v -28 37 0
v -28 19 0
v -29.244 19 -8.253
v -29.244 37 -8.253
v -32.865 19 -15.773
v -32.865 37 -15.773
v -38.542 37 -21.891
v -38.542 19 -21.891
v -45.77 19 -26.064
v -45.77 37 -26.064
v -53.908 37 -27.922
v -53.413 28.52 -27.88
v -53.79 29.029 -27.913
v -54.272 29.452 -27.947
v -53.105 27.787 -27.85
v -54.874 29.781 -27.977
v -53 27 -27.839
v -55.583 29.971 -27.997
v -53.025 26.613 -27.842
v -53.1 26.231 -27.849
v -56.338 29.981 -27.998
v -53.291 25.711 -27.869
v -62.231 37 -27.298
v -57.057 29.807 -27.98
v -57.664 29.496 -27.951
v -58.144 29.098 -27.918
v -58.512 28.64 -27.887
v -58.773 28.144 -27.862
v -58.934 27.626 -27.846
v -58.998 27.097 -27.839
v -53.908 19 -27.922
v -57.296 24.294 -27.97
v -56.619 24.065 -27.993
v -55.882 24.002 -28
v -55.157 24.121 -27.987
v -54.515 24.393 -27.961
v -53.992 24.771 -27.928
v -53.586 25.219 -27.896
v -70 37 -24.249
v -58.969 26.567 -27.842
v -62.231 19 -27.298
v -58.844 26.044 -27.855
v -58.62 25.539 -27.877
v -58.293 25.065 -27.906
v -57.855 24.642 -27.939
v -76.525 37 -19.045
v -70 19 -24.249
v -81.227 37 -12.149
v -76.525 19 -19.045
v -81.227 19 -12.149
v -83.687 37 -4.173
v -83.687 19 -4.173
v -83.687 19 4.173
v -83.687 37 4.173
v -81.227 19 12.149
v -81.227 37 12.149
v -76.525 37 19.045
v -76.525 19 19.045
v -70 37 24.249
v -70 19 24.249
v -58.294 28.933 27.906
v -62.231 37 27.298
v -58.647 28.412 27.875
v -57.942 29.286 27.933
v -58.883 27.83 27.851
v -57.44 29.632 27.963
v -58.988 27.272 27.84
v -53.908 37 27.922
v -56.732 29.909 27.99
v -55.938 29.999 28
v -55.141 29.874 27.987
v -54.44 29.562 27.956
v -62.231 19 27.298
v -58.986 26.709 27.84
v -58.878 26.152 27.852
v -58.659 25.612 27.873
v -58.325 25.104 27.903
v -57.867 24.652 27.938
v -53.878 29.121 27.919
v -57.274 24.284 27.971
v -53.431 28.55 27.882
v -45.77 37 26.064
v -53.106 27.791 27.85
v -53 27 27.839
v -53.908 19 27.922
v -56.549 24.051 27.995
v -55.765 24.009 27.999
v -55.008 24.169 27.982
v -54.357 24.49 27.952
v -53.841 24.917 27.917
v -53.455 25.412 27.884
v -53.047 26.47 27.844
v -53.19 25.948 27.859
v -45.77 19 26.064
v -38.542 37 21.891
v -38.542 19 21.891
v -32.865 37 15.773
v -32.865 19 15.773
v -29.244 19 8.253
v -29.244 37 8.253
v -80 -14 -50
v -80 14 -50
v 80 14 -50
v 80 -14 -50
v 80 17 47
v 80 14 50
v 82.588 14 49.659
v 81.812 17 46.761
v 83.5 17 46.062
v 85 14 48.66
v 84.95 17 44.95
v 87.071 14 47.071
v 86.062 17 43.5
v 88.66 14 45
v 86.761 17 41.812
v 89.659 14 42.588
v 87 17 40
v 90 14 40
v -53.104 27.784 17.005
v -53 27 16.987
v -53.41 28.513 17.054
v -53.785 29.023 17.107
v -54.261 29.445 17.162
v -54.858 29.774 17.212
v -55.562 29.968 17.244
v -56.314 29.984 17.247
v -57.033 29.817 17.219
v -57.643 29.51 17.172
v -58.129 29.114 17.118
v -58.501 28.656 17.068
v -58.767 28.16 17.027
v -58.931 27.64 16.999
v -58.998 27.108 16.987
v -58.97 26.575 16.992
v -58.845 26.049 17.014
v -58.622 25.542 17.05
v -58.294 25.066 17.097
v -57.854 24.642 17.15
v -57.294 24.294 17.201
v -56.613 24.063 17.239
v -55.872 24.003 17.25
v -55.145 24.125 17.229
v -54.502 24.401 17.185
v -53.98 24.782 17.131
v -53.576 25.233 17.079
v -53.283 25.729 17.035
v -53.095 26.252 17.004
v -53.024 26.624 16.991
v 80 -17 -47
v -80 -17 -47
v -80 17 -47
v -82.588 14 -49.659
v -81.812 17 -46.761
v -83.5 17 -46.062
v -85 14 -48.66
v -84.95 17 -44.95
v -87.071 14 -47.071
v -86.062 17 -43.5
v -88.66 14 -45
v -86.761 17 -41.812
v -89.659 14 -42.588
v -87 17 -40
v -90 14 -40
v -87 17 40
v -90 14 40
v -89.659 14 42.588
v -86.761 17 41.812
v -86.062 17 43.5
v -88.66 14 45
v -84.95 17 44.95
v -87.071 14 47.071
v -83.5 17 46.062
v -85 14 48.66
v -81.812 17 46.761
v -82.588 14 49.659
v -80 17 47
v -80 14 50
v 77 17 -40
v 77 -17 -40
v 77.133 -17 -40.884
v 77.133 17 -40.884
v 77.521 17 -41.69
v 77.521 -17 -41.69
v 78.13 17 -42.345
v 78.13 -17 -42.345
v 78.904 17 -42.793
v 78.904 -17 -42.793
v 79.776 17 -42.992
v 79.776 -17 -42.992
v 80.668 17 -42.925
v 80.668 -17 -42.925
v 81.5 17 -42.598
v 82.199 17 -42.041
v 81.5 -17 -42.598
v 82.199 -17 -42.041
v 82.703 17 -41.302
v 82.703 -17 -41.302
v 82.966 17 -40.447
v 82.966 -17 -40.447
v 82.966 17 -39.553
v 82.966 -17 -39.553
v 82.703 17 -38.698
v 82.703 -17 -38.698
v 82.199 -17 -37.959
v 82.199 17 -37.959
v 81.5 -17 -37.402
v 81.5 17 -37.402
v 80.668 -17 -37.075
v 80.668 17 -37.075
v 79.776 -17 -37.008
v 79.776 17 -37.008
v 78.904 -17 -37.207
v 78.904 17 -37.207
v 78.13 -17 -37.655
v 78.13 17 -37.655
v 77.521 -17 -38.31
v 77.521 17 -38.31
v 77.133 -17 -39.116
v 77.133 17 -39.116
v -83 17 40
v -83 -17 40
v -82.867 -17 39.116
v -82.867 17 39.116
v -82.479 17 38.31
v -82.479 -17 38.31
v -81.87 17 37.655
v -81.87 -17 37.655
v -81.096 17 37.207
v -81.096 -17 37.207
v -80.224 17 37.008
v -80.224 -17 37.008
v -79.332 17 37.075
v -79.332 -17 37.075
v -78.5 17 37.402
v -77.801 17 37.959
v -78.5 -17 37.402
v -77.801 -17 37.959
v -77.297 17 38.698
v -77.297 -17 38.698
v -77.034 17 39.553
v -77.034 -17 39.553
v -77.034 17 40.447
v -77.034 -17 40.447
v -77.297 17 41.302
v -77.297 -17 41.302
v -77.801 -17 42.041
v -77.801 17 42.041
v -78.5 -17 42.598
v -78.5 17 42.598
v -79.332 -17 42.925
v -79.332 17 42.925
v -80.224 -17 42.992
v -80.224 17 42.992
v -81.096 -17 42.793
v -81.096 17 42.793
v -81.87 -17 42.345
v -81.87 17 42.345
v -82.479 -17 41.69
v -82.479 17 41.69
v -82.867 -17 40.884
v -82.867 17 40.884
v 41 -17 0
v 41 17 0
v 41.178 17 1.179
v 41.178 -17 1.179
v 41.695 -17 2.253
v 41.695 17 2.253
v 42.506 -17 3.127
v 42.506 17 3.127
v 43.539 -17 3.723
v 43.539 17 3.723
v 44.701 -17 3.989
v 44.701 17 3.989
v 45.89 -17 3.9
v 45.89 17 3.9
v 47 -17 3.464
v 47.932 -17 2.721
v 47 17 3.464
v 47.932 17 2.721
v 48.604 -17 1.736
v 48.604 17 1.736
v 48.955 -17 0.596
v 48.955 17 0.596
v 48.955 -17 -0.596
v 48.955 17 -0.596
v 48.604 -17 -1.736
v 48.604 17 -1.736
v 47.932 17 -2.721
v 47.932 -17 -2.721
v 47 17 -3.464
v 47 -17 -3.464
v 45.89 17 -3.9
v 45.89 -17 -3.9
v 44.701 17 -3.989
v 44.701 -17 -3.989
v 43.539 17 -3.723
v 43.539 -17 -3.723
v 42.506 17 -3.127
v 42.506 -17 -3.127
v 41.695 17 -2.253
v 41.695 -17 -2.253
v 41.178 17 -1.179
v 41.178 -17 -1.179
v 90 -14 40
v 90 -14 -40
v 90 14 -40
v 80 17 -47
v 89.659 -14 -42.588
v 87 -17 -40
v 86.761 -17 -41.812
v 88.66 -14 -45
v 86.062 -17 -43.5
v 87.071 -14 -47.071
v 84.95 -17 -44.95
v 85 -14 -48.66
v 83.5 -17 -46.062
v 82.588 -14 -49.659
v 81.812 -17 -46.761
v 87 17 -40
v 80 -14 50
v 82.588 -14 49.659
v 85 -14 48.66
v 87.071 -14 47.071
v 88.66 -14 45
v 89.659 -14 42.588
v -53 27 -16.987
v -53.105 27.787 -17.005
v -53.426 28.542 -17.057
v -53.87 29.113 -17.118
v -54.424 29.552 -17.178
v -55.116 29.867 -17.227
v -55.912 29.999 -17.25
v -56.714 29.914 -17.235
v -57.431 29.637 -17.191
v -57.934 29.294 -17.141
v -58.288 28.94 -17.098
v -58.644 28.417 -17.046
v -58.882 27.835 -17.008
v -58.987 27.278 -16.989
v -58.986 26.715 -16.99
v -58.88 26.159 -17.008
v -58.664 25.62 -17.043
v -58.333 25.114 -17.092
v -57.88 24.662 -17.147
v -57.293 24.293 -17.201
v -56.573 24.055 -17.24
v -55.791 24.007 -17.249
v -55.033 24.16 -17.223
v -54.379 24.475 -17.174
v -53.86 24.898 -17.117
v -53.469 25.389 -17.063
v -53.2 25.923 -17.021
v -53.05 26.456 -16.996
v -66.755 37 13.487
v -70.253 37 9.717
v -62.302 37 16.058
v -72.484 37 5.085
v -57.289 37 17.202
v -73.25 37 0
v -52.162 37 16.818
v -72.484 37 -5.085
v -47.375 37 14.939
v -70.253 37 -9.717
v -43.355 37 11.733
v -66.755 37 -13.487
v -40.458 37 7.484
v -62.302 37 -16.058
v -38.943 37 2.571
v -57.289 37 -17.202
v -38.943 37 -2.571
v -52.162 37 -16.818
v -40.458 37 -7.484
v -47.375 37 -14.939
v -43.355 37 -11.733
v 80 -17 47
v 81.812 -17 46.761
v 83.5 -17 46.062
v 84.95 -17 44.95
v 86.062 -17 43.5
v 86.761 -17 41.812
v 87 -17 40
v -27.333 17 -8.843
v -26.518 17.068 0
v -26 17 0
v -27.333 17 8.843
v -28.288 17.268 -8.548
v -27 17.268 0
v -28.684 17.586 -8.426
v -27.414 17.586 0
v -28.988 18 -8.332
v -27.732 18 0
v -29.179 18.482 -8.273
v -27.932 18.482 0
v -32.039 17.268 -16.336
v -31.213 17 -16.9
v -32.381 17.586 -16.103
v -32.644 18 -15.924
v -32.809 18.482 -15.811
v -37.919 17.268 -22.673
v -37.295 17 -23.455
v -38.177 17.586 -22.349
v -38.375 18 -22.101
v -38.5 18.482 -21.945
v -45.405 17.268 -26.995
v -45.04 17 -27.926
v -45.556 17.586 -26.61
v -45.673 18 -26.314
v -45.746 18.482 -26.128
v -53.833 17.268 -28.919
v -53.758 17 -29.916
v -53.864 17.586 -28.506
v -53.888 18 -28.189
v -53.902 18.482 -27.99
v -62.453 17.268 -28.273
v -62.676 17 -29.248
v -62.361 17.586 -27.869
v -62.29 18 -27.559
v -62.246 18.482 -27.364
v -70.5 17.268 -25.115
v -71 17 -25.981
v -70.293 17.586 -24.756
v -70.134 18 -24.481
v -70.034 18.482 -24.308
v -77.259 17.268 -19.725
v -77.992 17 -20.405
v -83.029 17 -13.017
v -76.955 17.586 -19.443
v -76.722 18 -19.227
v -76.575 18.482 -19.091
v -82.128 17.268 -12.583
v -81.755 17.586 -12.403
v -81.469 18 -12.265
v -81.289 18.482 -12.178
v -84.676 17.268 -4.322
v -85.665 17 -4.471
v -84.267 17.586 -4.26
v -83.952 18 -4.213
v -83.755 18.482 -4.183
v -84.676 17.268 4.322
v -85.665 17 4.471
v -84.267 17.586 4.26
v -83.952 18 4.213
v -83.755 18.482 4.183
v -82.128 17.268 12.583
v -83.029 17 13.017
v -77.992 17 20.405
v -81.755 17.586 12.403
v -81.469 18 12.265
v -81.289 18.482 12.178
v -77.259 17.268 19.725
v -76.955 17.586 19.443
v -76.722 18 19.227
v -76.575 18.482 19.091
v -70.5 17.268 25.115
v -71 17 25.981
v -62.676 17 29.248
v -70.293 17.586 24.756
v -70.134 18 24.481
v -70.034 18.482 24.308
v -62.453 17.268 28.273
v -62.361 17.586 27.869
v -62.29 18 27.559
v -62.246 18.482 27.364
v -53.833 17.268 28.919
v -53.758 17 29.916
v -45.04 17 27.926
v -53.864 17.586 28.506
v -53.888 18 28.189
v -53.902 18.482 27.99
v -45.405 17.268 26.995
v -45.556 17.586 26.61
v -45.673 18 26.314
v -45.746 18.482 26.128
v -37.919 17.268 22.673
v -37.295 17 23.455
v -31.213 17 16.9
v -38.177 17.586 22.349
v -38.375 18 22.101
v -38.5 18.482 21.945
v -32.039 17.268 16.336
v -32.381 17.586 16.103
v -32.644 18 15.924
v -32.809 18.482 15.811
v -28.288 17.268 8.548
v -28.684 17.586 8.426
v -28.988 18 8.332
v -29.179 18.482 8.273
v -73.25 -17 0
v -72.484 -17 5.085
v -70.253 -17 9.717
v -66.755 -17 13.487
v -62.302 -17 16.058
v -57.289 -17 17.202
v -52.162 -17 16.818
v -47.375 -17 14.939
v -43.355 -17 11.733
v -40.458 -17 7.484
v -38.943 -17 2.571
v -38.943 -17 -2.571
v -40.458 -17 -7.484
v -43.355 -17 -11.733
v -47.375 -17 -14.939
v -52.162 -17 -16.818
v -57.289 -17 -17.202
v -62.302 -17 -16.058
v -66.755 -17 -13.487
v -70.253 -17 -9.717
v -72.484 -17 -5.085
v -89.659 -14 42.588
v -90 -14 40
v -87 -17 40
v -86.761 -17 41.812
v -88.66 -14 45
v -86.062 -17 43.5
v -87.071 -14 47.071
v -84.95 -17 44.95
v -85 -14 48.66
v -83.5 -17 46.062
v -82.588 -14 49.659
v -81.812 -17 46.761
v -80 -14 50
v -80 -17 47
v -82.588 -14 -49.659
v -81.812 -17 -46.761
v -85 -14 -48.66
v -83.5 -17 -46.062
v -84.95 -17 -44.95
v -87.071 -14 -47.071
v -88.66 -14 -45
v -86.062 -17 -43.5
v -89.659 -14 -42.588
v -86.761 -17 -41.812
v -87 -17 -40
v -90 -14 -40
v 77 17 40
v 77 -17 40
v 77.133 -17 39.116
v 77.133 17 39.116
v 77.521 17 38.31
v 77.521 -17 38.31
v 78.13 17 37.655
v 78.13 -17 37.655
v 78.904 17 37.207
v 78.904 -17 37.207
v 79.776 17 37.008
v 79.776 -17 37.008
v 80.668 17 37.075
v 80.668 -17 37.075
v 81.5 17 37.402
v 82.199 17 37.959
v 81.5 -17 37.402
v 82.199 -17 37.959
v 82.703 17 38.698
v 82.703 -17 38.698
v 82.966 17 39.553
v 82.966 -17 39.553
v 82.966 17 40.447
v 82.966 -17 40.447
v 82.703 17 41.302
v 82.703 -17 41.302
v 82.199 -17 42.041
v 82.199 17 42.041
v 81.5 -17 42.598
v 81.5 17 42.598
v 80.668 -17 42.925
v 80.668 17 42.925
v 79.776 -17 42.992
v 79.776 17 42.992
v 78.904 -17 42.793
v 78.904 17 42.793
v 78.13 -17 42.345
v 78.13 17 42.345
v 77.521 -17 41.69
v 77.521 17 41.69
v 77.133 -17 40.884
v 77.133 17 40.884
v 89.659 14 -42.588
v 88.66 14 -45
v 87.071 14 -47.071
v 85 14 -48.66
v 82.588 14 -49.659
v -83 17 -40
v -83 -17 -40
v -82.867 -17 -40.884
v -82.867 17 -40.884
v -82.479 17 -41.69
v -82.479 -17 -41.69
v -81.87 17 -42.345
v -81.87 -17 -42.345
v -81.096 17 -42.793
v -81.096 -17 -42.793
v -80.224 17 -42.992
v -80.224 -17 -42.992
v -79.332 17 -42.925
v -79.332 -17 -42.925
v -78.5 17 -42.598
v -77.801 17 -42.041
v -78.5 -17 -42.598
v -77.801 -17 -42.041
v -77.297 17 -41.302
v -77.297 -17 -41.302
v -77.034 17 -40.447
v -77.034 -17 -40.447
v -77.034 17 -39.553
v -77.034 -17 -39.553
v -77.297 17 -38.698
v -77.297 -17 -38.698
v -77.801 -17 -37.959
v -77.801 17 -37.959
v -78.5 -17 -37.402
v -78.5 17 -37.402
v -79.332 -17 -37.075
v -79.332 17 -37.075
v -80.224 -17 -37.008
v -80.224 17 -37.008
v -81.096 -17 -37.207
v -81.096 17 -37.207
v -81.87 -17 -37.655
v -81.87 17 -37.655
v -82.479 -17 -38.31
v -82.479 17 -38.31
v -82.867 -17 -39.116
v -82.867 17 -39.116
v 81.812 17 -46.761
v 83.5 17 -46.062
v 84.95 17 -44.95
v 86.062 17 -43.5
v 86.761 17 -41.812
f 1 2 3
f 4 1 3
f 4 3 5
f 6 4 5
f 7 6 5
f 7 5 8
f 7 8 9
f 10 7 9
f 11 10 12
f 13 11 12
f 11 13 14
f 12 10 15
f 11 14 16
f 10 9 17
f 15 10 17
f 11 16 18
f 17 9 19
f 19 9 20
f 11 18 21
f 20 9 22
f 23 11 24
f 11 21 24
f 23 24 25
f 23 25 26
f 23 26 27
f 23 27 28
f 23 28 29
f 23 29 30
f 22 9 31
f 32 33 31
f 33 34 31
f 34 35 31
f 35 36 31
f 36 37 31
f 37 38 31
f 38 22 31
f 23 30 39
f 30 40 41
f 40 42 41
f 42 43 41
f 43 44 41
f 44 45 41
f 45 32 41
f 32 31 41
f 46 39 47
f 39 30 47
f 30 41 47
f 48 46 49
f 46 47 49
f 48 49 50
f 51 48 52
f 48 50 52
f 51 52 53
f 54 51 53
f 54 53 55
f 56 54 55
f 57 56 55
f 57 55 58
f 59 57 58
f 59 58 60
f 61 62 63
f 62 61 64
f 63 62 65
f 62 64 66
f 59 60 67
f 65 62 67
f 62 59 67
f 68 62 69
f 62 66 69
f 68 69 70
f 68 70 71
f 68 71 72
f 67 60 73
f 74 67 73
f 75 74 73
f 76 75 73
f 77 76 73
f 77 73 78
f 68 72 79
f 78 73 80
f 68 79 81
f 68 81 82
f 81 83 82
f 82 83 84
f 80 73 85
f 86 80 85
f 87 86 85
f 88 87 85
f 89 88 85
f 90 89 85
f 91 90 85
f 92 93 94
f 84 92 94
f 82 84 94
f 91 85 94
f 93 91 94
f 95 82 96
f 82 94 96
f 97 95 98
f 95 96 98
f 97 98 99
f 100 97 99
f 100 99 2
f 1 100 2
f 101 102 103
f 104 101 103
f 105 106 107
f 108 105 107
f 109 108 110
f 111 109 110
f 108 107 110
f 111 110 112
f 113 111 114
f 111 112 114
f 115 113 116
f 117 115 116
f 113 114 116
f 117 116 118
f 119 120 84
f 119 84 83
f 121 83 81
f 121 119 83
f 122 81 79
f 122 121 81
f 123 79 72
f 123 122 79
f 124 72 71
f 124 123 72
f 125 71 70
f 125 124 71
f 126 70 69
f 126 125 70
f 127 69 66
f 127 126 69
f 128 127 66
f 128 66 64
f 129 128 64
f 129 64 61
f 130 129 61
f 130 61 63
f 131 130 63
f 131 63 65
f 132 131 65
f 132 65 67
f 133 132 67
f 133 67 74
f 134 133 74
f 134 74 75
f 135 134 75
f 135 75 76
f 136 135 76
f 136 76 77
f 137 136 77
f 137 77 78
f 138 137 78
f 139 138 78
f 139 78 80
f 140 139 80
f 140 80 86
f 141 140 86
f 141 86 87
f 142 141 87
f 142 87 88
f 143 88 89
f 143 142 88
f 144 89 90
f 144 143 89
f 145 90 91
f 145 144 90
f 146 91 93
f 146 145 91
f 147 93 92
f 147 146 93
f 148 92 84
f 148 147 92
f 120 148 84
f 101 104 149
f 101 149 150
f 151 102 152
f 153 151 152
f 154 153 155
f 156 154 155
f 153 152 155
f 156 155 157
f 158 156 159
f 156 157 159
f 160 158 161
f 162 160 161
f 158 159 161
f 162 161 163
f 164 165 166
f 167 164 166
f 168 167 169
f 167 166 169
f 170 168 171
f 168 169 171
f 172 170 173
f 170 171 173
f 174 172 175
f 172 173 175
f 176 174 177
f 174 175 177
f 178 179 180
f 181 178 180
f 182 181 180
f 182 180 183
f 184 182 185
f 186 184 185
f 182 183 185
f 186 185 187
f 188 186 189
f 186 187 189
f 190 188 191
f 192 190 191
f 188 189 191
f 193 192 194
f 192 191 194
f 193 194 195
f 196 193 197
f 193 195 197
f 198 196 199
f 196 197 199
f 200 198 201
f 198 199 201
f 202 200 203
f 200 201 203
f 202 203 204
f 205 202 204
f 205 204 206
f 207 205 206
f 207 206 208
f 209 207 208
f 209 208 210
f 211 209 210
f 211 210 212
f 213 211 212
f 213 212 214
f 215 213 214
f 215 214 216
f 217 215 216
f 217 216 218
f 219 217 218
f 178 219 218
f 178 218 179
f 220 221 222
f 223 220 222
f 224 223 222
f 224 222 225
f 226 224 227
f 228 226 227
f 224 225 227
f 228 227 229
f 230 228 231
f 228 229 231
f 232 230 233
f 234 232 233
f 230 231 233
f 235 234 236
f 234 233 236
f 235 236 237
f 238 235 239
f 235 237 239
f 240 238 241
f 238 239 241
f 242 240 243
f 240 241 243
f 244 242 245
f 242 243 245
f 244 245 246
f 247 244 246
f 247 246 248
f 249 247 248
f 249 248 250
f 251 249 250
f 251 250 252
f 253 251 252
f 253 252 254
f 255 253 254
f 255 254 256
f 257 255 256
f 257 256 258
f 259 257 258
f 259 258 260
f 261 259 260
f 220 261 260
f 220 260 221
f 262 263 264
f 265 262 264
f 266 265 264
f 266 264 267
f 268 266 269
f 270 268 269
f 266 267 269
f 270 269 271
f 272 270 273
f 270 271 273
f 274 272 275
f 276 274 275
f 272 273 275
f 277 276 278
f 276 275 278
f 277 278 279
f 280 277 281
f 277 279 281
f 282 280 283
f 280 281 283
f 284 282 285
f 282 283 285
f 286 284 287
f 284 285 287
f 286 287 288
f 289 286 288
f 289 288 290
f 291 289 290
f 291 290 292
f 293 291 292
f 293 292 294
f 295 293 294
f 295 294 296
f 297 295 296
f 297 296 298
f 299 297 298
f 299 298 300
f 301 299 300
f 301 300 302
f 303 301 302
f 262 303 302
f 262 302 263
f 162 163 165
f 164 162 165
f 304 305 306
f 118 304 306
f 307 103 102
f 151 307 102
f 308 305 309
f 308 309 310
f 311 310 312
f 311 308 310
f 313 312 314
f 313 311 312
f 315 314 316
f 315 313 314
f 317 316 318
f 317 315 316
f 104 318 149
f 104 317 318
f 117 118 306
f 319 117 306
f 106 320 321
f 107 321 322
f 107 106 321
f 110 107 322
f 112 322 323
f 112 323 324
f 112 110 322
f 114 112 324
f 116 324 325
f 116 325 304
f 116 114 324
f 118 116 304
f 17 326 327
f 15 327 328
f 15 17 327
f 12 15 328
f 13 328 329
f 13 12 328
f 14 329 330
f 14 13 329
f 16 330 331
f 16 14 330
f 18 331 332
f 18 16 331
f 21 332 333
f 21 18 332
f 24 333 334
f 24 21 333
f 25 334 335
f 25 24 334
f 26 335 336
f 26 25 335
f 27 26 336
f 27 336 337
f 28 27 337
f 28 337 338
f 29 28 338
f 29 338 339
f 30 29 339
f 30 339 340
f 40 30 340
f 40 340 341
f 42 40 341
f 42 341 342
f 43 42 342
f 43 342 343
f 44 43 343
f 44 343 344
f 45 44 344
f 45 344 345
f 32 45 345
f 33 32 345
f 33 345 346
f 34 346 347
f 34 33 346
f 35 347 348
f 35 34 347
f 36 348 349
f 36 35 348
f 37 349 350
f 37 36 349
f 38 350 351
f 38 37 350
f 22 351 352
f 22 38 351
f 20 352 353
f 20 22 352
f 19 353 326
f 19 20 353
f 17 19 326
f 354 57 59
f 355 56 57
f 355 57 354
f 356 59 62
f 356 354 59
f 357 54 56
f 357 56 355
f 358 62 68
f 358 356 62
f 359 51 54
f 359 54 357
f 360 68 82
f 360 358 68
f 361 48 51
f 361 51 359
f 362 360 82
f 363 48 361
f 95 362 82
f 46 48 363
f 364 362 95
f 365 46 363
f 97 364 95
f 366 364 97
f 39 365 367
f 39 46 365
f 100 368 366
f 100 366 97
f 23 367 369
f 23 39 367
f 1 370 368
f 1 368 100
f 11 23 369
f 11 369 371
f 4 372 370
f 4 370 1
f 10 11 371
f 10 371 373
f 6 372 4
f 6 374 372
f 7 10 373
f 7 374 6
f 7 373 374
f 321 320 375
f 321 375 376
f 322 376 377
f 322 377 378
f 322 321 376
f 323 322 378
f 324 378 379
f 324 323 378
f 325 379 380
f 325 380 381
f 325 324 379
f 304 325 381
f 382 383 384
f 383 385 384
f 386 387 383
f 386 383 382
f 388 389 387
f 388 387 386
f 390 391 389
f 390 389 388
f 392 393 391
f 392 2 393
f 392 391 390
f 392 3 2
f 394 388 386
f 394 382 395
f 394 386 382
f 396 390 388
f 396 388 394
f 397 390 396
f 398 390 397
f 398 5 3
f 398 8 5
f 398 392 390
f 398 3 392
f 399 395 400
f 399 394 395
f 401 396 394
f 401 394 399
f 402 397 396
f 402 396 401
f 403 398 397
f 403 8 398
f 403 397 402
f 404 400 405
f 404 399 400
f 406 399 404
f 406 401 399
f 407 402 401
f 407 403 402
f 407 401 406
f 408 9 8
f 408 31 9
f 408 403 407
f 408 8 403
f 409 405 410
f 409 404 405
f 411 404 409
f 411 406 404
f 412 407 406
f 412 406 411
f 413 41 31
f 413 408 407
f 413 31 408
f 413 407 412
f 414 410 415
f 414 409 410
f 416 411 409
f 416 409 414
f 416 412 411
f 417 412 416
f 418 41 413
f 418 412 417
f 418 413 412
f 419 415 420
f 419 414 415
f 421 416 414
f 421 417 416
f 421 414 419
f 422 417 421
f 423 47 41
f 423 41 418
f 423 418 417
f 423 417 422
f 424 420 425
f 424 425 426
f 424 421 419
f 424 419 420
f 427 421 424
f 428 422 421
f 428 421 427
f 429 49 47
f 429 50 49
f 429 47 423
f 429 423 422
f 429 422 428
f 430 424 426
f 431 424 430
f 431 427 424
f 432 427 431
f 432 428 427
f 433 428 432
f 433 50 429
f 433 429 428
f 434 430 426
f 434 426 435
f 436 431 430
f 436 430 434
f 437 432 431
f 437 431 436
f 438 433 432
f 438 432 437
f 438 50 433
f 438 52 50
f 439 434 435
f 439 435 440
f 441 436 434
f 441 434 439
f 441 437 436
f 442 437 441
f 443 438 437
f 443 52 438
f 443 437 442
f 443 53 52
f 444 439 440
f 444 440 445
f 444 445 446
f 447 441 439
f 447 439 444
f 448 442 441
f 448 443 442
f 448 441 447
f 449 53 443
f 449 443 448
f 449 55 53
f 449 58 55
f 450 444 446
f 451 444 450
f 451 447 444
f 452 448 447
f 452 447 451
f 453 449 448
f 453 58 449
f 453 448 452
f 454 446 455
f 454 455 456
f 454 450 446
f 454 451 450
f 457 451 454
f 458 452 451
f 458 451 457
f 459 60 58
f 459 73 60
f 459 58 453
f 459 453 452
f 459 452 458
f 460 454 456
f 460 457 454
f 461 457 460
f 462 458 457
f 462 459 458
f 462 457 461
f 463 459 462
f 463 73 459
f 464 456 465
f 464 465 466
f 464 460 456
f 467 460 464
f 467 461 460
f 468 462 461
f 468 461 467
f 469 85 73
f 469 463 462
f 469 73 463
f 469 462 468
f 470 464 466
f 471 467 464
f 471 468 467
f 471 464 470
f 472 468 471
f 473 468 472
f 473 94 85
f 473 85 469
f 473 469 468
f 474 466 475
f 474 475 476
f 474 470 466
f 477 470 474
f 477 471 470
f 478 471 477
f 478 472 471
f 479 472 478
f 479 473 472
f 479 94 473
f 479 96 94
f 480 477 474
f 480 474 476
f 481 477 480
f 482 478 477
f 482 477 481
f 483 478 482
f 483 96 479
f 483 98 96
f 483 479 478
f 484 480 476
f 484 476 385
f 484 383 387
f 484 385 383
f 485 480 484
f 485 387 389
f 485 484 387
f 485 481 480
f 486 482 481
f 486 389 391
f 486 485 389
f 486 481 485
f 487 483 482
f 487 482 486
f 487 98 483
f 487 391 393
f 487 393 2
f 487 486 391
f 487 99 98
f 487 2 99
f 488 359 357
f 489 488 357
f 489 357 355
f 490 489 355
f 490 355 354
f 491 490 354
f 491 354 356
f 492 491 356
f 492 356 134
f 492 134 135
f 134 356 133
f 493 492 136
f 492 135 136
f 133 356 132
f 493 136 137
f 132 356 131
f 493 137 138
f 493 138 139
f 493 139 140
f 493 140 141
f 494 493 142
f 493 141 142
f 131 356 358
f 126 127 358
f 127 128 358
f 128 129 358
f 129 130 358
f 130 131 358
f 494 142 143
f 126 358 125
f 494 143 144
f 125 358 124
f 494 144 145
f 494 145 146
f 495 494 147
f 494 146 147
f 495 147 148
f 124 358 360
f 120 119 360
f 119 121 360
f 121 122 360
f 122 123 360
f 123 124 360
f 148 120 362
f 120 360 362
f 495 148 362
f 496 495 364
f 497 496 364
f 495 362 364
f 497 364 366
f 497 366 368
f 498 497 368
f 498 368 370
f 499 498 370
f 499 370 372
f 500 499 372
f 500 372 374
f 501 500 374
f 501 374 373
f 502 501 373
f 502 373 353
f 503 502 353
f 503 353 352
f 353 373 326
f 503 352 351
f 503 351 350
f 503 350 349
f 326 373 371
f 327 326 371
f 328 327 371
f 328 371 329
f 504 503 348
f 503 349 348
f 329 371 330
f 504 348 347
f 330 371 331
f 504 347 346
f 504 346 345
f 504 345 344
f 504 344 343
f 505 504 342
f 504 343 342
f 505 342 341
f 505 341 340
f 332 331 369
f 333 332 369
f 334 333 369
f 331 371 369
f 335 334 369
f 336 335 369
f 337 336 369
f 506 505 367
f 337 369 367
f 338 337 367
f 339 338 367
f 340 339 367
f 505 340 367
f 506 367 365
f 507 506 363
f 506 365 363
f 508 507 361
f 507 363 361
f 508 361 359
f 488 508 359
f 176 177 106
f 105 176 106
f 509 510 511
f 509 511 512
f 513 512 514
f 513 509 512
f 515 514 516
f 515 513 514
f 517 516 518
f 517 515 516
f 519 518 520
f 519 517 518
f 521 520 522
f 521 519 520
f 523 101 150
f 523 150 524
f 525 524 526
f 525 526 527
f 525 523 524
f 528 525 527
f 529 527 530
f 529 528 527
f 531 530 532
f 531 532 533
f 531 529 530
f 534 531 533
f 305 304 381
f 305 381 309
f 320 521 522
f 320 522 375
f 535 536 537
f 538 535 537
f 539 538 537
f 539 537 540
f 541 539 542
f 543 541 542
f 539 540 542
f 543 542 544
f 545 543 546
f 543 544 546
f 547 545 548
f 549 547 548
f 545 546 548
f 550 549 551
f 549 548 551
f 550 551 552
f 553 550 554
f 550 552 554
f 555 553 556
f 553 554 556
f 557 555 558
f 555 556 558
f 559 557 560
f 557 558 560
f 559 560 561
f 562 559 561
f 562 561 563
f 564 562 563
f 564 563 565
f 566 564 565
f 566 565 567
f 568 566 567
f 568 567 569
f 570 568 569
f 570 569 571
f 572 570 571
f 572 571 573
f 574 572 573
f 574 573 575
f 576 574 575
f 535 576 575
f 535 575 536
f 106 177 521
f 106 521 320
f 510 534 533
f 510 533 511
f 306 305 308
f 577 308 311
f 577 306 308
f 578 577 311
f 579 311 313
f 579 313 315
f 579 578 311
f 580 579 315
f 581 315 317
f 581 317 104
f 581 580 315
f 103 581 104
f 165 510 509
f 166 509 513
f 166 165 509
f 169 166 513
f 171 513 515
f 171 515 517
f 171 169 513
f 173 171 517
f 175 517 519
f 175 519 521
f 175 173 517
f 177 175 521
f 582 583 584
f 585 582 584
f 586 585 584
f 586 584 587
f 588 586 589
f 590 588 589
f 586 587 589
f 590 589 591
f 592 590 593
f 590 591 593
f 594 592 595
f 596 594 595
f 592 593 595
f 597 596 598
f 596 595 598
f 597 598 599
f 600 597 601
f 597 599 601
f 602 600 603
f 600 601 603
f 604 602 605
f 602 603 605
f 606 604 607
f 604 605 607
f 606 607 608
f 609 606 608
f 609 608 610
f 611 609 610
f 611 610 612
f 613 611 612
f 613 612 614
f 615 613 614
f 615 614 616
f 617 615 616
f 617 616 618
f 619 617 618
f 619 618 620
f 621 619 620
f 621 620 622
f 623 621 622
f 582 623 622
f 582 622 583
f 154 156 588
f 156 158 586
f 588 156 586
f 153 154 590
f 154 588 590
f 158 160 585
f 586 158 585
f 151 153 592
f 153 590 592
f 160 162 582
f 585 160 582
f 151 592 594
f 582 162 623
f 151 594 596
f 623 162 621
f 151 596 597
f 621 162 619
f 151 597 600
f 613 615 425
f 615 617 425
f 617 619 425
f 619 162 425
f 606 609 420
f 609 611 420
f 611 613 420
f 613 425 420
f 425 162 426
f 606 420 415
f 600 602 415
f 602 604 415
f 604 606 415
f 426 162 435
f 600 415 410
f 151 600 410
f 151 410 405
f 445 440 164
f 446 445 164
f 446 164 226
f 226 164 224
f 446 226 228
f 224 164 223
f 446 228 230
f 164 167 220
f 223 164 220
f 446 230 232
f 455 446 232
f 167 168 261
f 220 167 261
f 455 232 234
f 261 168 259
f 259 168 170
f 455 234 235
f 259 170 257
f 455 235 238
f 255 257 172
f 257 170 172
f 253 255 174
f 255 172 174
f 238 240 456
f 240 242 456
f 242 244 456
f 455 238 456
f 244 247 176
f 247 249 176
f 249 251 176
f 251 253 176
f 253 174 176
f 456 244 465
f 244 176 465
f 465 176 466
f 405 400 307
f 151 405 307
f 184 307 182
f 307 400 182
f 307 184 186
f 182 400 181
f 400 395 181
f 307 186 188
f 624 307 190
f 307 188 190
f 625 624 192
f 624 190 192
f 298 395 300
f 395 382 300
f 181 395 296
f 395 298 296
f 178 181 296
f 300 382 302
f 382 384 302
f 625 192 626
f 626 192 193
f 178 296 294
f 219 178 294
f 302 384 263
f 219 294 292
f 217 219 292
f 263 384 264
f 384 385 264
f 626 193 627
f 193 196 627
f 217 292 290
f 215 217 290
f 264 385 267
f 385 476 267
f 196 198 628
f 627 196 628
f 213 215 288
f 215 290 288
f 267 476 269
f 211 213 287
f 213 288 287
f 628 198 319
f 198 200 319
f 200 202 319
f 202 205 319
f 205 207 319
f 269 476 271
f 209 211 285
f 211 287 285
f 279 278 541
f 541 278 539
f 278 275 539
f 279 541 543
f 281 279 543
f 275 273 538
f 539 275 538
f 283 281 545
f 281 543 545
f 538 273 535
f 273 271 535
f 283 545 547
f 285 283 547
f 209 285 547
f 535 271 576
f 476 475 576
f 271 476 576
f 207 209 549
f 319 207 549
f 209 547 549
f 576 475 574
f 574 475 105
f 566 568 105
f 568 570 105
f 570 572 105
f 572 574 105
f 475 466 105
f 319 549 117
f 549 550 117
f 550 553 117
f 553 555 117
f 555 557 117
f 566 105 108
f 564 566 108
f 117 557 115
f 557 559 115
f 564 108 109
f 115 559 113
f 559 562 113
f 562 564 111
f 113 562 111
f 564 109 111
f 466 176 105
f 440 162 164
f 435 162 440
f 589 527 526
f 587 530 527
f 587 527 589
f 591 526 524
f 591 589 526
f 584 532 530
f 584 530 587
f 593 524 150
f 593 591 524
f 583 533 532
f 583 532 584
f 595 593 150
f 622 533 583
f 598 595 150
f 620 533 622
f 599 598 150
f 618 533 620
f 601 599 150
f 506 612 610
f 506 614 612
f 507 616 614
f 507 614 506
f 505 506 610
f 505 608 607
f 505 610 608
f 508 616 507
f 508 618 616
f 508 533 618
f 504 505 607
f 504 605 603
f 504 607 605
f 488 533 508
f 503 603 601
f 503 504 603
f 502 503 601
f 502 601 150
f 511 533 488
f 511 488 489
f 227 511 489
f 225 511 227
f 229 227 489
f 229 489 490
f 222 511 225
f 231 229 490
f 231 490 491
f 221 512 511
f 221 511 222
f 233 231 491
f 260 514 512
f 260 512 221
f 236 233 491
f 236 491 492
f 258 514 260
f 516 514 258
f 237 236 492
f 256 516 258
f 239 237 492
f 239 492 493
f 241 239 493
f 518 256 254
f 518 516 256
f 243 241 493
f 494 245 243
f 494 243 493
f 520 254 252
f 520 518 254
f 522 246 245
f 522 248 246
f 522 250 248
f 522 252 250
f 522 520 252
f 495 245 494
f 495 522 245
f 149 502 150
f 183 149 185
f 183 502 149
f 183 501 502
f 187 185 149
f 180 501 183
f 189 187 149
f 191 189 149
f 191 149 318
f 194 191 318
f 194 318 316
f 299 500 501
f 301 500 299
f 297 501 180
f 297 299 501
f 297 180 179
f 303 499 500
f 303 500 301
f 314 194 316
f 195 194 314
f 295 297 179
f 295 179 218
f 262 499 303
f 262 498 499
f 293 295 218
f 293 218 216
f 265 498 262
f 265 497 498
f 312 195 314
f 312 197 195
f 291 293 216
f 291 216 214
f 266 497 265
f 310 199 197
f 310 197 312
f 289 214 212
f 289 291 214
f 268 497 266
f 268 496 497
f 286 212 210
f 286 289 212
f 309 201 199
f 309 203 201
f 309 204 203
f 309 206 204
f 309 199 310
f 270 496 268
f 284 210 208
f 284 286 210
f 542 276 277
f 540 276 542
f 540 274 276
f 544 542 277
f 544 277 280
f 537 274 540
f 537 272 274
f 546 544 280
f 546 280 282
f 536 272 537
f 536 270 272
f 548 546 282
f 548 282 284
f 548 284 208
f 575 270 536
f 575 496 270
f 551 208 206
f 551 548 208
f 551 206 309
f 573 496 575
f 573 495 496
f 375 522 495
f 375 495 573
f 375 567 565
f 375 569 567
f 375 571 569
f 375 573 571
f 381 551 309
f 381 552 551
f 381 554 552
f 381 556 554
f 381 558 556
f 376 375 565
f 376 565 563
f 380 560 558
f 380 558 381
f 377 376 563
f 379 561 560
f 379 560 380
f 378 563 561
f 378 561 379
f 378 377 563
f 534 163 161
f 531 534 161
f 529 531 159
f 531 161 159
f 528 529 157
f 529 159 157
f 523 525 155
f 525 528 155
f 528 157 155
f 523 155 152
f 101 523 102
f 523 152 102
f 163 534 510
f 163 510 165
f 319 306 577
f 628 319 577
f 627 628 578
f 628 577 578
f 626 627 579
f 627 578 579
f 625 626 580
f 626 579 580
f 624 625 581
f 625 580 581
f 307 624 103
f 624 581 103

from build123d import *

# Parameters (mm, degrees)
SKETCH1_W                = 180
SKETCH1_H                = 34
BOSS_EXTRUDE1_DEPTH      = 50
FILLET1_R                = 10
CHAMFER1_SIZE            = 3
SKETCH2_R                = 28
BOSS_EXTRUDE2_DEPTH      = 20
SKETCH3_R                = 17.25
CUT_EXTRUDE1_DEPTH       = 117.258333035
SKETCH4_R                = 4
CUT_EXTRUDE2_DEPTH       = 109.425089347
FILLET2_R                = 2
F_6_0_6_DIAMETER_HOLE1_D = 6
CUT_EXTRUDE3_DEPTH       = 110.402925007
CUT_EXTRUDE3_DEPTH_BACK  = 110.402925007
SKETCH8_R                = 3


with BuildPart() as part:
    # Sketch1 → Boss-Extrude1 (new, symmetric)
    with BuildSketch(Plane.XY):
        Rectangle(SKETCH1_W, SKETCH1_H)
    extrude(amount=BOSS_EXTRUDE1_DEPTH, both=True)

    # Fillet1
    fillet1_edges = [part.edges().sort_by_distance(p)[0] for p in [
        (90, 0, 50),
        (-90, 0, 50),
        (90, 0, -50),
        (-90, 0, -50),
    ]]
    fillet(fillet1_edges, radius=FILLET1_R)

    # Chamfer1
    chamfer1_edges = [part.edges().sort_by_distance(p)[0] for p in [
        (0, -17, 50),
        (0, 17, 50),
        (0, -17, -50),
        (90, -17, 0),
        (-90, -17, 0),
        (87.071067812, -17, 47.071067812),
        (87.071067812, -17, -47.071067812),
        (-87.071067812, -17, -47.071067812),
        (-87.071067812, -17, 47.071067812),
        (-90, 17, 0),
        (0, 17, -50),
        (90, 17, 0),
        (87.071067812, 17, 47.071067812),
        (87.071067812, 17, -47.071067812),
        (-87.071067812, 17, -47.071067812),
        (-87.071067812, 17, 47.071067812),
    ]]
    chamfer(chamfer1_edges, length=CHAMFER1_SIZE)

    # Sketch2 → Boss-Extrude2 (add)
    with BuildSketch(Plane(origin=(0, 17, 0), x_dir=(1, 0, 0), z_dir=(0, 1, 0))):
        with Locations((-56, 0)):
            Circle(SKETCH2_R)
    extrude(amount=BOSS_EXTRUDE2_DEPTH)

    # Sketch3 → Cut-Extrude1 (cut, through all)
    with BuildSketch(Plane(origin=(0, 37, 0), x_dir=(1, 0, 0), z_dir=(0, 1, 0))):
        with Locations(Location((-56, 0, 0), (0, 0, 180))):
            Circle(SKETCH3_R)
    extrude(amount=-CUT_EXTRUDE1_DEPTH, mode=Mode.SUBTRACT)

    # Sketch4 → Cut-Extrude2 (cut, through all)
    with BuildSketch(Plane(origin=(0, 17, 0), x_dir=(1, 0, 0), z_dir=(0, 1, 0))):
        with Locations(Location((45, 0, 0), (0, 0, 180))):
            Circle(SKETCH4_R)
    extrude(amount=-CUT_EXTRUDE2_DEPTH, mode=Mode.SUBTRACT)

    # Fillet2
    fillet2_edges = [part.edges().sort_by_distance(p)[0] for p in [
        (-84, 17, 0),
    ]]
    fillet(fillet2_edges, radius=FILLET2_R)

    # Ø6.0 (6) Diameter Hole1 (through all)
    with Locations(Plane(origin=(0, 17, 0), x_dir=(1, 0, 0), z_dir=(0, 1, 0))):
        with Locations((80, -40), (-80, -40), (80, 40), (-80, 40)):
            Hole(F_6_0_6_DIAMETER_HOLE1_D / 2)

    # Sketch8 → Cut-Extrude3 (cut, two sides: drawn at the far end of the back side and taken through both)
    with BuildSketch(Plane.XY.offset(-CUT_EXTRUDE3_DEPTH_BACK)):
        with Locations((-56, 27)):
            Circle(SKETCH8_R)
    extrude(amount=CUT_EXTRUDE3_DEPTH + CUT_EXTRUDE3_DEPTH_BACK, mode=Mode.SUBTRACT)


solid = part.part
